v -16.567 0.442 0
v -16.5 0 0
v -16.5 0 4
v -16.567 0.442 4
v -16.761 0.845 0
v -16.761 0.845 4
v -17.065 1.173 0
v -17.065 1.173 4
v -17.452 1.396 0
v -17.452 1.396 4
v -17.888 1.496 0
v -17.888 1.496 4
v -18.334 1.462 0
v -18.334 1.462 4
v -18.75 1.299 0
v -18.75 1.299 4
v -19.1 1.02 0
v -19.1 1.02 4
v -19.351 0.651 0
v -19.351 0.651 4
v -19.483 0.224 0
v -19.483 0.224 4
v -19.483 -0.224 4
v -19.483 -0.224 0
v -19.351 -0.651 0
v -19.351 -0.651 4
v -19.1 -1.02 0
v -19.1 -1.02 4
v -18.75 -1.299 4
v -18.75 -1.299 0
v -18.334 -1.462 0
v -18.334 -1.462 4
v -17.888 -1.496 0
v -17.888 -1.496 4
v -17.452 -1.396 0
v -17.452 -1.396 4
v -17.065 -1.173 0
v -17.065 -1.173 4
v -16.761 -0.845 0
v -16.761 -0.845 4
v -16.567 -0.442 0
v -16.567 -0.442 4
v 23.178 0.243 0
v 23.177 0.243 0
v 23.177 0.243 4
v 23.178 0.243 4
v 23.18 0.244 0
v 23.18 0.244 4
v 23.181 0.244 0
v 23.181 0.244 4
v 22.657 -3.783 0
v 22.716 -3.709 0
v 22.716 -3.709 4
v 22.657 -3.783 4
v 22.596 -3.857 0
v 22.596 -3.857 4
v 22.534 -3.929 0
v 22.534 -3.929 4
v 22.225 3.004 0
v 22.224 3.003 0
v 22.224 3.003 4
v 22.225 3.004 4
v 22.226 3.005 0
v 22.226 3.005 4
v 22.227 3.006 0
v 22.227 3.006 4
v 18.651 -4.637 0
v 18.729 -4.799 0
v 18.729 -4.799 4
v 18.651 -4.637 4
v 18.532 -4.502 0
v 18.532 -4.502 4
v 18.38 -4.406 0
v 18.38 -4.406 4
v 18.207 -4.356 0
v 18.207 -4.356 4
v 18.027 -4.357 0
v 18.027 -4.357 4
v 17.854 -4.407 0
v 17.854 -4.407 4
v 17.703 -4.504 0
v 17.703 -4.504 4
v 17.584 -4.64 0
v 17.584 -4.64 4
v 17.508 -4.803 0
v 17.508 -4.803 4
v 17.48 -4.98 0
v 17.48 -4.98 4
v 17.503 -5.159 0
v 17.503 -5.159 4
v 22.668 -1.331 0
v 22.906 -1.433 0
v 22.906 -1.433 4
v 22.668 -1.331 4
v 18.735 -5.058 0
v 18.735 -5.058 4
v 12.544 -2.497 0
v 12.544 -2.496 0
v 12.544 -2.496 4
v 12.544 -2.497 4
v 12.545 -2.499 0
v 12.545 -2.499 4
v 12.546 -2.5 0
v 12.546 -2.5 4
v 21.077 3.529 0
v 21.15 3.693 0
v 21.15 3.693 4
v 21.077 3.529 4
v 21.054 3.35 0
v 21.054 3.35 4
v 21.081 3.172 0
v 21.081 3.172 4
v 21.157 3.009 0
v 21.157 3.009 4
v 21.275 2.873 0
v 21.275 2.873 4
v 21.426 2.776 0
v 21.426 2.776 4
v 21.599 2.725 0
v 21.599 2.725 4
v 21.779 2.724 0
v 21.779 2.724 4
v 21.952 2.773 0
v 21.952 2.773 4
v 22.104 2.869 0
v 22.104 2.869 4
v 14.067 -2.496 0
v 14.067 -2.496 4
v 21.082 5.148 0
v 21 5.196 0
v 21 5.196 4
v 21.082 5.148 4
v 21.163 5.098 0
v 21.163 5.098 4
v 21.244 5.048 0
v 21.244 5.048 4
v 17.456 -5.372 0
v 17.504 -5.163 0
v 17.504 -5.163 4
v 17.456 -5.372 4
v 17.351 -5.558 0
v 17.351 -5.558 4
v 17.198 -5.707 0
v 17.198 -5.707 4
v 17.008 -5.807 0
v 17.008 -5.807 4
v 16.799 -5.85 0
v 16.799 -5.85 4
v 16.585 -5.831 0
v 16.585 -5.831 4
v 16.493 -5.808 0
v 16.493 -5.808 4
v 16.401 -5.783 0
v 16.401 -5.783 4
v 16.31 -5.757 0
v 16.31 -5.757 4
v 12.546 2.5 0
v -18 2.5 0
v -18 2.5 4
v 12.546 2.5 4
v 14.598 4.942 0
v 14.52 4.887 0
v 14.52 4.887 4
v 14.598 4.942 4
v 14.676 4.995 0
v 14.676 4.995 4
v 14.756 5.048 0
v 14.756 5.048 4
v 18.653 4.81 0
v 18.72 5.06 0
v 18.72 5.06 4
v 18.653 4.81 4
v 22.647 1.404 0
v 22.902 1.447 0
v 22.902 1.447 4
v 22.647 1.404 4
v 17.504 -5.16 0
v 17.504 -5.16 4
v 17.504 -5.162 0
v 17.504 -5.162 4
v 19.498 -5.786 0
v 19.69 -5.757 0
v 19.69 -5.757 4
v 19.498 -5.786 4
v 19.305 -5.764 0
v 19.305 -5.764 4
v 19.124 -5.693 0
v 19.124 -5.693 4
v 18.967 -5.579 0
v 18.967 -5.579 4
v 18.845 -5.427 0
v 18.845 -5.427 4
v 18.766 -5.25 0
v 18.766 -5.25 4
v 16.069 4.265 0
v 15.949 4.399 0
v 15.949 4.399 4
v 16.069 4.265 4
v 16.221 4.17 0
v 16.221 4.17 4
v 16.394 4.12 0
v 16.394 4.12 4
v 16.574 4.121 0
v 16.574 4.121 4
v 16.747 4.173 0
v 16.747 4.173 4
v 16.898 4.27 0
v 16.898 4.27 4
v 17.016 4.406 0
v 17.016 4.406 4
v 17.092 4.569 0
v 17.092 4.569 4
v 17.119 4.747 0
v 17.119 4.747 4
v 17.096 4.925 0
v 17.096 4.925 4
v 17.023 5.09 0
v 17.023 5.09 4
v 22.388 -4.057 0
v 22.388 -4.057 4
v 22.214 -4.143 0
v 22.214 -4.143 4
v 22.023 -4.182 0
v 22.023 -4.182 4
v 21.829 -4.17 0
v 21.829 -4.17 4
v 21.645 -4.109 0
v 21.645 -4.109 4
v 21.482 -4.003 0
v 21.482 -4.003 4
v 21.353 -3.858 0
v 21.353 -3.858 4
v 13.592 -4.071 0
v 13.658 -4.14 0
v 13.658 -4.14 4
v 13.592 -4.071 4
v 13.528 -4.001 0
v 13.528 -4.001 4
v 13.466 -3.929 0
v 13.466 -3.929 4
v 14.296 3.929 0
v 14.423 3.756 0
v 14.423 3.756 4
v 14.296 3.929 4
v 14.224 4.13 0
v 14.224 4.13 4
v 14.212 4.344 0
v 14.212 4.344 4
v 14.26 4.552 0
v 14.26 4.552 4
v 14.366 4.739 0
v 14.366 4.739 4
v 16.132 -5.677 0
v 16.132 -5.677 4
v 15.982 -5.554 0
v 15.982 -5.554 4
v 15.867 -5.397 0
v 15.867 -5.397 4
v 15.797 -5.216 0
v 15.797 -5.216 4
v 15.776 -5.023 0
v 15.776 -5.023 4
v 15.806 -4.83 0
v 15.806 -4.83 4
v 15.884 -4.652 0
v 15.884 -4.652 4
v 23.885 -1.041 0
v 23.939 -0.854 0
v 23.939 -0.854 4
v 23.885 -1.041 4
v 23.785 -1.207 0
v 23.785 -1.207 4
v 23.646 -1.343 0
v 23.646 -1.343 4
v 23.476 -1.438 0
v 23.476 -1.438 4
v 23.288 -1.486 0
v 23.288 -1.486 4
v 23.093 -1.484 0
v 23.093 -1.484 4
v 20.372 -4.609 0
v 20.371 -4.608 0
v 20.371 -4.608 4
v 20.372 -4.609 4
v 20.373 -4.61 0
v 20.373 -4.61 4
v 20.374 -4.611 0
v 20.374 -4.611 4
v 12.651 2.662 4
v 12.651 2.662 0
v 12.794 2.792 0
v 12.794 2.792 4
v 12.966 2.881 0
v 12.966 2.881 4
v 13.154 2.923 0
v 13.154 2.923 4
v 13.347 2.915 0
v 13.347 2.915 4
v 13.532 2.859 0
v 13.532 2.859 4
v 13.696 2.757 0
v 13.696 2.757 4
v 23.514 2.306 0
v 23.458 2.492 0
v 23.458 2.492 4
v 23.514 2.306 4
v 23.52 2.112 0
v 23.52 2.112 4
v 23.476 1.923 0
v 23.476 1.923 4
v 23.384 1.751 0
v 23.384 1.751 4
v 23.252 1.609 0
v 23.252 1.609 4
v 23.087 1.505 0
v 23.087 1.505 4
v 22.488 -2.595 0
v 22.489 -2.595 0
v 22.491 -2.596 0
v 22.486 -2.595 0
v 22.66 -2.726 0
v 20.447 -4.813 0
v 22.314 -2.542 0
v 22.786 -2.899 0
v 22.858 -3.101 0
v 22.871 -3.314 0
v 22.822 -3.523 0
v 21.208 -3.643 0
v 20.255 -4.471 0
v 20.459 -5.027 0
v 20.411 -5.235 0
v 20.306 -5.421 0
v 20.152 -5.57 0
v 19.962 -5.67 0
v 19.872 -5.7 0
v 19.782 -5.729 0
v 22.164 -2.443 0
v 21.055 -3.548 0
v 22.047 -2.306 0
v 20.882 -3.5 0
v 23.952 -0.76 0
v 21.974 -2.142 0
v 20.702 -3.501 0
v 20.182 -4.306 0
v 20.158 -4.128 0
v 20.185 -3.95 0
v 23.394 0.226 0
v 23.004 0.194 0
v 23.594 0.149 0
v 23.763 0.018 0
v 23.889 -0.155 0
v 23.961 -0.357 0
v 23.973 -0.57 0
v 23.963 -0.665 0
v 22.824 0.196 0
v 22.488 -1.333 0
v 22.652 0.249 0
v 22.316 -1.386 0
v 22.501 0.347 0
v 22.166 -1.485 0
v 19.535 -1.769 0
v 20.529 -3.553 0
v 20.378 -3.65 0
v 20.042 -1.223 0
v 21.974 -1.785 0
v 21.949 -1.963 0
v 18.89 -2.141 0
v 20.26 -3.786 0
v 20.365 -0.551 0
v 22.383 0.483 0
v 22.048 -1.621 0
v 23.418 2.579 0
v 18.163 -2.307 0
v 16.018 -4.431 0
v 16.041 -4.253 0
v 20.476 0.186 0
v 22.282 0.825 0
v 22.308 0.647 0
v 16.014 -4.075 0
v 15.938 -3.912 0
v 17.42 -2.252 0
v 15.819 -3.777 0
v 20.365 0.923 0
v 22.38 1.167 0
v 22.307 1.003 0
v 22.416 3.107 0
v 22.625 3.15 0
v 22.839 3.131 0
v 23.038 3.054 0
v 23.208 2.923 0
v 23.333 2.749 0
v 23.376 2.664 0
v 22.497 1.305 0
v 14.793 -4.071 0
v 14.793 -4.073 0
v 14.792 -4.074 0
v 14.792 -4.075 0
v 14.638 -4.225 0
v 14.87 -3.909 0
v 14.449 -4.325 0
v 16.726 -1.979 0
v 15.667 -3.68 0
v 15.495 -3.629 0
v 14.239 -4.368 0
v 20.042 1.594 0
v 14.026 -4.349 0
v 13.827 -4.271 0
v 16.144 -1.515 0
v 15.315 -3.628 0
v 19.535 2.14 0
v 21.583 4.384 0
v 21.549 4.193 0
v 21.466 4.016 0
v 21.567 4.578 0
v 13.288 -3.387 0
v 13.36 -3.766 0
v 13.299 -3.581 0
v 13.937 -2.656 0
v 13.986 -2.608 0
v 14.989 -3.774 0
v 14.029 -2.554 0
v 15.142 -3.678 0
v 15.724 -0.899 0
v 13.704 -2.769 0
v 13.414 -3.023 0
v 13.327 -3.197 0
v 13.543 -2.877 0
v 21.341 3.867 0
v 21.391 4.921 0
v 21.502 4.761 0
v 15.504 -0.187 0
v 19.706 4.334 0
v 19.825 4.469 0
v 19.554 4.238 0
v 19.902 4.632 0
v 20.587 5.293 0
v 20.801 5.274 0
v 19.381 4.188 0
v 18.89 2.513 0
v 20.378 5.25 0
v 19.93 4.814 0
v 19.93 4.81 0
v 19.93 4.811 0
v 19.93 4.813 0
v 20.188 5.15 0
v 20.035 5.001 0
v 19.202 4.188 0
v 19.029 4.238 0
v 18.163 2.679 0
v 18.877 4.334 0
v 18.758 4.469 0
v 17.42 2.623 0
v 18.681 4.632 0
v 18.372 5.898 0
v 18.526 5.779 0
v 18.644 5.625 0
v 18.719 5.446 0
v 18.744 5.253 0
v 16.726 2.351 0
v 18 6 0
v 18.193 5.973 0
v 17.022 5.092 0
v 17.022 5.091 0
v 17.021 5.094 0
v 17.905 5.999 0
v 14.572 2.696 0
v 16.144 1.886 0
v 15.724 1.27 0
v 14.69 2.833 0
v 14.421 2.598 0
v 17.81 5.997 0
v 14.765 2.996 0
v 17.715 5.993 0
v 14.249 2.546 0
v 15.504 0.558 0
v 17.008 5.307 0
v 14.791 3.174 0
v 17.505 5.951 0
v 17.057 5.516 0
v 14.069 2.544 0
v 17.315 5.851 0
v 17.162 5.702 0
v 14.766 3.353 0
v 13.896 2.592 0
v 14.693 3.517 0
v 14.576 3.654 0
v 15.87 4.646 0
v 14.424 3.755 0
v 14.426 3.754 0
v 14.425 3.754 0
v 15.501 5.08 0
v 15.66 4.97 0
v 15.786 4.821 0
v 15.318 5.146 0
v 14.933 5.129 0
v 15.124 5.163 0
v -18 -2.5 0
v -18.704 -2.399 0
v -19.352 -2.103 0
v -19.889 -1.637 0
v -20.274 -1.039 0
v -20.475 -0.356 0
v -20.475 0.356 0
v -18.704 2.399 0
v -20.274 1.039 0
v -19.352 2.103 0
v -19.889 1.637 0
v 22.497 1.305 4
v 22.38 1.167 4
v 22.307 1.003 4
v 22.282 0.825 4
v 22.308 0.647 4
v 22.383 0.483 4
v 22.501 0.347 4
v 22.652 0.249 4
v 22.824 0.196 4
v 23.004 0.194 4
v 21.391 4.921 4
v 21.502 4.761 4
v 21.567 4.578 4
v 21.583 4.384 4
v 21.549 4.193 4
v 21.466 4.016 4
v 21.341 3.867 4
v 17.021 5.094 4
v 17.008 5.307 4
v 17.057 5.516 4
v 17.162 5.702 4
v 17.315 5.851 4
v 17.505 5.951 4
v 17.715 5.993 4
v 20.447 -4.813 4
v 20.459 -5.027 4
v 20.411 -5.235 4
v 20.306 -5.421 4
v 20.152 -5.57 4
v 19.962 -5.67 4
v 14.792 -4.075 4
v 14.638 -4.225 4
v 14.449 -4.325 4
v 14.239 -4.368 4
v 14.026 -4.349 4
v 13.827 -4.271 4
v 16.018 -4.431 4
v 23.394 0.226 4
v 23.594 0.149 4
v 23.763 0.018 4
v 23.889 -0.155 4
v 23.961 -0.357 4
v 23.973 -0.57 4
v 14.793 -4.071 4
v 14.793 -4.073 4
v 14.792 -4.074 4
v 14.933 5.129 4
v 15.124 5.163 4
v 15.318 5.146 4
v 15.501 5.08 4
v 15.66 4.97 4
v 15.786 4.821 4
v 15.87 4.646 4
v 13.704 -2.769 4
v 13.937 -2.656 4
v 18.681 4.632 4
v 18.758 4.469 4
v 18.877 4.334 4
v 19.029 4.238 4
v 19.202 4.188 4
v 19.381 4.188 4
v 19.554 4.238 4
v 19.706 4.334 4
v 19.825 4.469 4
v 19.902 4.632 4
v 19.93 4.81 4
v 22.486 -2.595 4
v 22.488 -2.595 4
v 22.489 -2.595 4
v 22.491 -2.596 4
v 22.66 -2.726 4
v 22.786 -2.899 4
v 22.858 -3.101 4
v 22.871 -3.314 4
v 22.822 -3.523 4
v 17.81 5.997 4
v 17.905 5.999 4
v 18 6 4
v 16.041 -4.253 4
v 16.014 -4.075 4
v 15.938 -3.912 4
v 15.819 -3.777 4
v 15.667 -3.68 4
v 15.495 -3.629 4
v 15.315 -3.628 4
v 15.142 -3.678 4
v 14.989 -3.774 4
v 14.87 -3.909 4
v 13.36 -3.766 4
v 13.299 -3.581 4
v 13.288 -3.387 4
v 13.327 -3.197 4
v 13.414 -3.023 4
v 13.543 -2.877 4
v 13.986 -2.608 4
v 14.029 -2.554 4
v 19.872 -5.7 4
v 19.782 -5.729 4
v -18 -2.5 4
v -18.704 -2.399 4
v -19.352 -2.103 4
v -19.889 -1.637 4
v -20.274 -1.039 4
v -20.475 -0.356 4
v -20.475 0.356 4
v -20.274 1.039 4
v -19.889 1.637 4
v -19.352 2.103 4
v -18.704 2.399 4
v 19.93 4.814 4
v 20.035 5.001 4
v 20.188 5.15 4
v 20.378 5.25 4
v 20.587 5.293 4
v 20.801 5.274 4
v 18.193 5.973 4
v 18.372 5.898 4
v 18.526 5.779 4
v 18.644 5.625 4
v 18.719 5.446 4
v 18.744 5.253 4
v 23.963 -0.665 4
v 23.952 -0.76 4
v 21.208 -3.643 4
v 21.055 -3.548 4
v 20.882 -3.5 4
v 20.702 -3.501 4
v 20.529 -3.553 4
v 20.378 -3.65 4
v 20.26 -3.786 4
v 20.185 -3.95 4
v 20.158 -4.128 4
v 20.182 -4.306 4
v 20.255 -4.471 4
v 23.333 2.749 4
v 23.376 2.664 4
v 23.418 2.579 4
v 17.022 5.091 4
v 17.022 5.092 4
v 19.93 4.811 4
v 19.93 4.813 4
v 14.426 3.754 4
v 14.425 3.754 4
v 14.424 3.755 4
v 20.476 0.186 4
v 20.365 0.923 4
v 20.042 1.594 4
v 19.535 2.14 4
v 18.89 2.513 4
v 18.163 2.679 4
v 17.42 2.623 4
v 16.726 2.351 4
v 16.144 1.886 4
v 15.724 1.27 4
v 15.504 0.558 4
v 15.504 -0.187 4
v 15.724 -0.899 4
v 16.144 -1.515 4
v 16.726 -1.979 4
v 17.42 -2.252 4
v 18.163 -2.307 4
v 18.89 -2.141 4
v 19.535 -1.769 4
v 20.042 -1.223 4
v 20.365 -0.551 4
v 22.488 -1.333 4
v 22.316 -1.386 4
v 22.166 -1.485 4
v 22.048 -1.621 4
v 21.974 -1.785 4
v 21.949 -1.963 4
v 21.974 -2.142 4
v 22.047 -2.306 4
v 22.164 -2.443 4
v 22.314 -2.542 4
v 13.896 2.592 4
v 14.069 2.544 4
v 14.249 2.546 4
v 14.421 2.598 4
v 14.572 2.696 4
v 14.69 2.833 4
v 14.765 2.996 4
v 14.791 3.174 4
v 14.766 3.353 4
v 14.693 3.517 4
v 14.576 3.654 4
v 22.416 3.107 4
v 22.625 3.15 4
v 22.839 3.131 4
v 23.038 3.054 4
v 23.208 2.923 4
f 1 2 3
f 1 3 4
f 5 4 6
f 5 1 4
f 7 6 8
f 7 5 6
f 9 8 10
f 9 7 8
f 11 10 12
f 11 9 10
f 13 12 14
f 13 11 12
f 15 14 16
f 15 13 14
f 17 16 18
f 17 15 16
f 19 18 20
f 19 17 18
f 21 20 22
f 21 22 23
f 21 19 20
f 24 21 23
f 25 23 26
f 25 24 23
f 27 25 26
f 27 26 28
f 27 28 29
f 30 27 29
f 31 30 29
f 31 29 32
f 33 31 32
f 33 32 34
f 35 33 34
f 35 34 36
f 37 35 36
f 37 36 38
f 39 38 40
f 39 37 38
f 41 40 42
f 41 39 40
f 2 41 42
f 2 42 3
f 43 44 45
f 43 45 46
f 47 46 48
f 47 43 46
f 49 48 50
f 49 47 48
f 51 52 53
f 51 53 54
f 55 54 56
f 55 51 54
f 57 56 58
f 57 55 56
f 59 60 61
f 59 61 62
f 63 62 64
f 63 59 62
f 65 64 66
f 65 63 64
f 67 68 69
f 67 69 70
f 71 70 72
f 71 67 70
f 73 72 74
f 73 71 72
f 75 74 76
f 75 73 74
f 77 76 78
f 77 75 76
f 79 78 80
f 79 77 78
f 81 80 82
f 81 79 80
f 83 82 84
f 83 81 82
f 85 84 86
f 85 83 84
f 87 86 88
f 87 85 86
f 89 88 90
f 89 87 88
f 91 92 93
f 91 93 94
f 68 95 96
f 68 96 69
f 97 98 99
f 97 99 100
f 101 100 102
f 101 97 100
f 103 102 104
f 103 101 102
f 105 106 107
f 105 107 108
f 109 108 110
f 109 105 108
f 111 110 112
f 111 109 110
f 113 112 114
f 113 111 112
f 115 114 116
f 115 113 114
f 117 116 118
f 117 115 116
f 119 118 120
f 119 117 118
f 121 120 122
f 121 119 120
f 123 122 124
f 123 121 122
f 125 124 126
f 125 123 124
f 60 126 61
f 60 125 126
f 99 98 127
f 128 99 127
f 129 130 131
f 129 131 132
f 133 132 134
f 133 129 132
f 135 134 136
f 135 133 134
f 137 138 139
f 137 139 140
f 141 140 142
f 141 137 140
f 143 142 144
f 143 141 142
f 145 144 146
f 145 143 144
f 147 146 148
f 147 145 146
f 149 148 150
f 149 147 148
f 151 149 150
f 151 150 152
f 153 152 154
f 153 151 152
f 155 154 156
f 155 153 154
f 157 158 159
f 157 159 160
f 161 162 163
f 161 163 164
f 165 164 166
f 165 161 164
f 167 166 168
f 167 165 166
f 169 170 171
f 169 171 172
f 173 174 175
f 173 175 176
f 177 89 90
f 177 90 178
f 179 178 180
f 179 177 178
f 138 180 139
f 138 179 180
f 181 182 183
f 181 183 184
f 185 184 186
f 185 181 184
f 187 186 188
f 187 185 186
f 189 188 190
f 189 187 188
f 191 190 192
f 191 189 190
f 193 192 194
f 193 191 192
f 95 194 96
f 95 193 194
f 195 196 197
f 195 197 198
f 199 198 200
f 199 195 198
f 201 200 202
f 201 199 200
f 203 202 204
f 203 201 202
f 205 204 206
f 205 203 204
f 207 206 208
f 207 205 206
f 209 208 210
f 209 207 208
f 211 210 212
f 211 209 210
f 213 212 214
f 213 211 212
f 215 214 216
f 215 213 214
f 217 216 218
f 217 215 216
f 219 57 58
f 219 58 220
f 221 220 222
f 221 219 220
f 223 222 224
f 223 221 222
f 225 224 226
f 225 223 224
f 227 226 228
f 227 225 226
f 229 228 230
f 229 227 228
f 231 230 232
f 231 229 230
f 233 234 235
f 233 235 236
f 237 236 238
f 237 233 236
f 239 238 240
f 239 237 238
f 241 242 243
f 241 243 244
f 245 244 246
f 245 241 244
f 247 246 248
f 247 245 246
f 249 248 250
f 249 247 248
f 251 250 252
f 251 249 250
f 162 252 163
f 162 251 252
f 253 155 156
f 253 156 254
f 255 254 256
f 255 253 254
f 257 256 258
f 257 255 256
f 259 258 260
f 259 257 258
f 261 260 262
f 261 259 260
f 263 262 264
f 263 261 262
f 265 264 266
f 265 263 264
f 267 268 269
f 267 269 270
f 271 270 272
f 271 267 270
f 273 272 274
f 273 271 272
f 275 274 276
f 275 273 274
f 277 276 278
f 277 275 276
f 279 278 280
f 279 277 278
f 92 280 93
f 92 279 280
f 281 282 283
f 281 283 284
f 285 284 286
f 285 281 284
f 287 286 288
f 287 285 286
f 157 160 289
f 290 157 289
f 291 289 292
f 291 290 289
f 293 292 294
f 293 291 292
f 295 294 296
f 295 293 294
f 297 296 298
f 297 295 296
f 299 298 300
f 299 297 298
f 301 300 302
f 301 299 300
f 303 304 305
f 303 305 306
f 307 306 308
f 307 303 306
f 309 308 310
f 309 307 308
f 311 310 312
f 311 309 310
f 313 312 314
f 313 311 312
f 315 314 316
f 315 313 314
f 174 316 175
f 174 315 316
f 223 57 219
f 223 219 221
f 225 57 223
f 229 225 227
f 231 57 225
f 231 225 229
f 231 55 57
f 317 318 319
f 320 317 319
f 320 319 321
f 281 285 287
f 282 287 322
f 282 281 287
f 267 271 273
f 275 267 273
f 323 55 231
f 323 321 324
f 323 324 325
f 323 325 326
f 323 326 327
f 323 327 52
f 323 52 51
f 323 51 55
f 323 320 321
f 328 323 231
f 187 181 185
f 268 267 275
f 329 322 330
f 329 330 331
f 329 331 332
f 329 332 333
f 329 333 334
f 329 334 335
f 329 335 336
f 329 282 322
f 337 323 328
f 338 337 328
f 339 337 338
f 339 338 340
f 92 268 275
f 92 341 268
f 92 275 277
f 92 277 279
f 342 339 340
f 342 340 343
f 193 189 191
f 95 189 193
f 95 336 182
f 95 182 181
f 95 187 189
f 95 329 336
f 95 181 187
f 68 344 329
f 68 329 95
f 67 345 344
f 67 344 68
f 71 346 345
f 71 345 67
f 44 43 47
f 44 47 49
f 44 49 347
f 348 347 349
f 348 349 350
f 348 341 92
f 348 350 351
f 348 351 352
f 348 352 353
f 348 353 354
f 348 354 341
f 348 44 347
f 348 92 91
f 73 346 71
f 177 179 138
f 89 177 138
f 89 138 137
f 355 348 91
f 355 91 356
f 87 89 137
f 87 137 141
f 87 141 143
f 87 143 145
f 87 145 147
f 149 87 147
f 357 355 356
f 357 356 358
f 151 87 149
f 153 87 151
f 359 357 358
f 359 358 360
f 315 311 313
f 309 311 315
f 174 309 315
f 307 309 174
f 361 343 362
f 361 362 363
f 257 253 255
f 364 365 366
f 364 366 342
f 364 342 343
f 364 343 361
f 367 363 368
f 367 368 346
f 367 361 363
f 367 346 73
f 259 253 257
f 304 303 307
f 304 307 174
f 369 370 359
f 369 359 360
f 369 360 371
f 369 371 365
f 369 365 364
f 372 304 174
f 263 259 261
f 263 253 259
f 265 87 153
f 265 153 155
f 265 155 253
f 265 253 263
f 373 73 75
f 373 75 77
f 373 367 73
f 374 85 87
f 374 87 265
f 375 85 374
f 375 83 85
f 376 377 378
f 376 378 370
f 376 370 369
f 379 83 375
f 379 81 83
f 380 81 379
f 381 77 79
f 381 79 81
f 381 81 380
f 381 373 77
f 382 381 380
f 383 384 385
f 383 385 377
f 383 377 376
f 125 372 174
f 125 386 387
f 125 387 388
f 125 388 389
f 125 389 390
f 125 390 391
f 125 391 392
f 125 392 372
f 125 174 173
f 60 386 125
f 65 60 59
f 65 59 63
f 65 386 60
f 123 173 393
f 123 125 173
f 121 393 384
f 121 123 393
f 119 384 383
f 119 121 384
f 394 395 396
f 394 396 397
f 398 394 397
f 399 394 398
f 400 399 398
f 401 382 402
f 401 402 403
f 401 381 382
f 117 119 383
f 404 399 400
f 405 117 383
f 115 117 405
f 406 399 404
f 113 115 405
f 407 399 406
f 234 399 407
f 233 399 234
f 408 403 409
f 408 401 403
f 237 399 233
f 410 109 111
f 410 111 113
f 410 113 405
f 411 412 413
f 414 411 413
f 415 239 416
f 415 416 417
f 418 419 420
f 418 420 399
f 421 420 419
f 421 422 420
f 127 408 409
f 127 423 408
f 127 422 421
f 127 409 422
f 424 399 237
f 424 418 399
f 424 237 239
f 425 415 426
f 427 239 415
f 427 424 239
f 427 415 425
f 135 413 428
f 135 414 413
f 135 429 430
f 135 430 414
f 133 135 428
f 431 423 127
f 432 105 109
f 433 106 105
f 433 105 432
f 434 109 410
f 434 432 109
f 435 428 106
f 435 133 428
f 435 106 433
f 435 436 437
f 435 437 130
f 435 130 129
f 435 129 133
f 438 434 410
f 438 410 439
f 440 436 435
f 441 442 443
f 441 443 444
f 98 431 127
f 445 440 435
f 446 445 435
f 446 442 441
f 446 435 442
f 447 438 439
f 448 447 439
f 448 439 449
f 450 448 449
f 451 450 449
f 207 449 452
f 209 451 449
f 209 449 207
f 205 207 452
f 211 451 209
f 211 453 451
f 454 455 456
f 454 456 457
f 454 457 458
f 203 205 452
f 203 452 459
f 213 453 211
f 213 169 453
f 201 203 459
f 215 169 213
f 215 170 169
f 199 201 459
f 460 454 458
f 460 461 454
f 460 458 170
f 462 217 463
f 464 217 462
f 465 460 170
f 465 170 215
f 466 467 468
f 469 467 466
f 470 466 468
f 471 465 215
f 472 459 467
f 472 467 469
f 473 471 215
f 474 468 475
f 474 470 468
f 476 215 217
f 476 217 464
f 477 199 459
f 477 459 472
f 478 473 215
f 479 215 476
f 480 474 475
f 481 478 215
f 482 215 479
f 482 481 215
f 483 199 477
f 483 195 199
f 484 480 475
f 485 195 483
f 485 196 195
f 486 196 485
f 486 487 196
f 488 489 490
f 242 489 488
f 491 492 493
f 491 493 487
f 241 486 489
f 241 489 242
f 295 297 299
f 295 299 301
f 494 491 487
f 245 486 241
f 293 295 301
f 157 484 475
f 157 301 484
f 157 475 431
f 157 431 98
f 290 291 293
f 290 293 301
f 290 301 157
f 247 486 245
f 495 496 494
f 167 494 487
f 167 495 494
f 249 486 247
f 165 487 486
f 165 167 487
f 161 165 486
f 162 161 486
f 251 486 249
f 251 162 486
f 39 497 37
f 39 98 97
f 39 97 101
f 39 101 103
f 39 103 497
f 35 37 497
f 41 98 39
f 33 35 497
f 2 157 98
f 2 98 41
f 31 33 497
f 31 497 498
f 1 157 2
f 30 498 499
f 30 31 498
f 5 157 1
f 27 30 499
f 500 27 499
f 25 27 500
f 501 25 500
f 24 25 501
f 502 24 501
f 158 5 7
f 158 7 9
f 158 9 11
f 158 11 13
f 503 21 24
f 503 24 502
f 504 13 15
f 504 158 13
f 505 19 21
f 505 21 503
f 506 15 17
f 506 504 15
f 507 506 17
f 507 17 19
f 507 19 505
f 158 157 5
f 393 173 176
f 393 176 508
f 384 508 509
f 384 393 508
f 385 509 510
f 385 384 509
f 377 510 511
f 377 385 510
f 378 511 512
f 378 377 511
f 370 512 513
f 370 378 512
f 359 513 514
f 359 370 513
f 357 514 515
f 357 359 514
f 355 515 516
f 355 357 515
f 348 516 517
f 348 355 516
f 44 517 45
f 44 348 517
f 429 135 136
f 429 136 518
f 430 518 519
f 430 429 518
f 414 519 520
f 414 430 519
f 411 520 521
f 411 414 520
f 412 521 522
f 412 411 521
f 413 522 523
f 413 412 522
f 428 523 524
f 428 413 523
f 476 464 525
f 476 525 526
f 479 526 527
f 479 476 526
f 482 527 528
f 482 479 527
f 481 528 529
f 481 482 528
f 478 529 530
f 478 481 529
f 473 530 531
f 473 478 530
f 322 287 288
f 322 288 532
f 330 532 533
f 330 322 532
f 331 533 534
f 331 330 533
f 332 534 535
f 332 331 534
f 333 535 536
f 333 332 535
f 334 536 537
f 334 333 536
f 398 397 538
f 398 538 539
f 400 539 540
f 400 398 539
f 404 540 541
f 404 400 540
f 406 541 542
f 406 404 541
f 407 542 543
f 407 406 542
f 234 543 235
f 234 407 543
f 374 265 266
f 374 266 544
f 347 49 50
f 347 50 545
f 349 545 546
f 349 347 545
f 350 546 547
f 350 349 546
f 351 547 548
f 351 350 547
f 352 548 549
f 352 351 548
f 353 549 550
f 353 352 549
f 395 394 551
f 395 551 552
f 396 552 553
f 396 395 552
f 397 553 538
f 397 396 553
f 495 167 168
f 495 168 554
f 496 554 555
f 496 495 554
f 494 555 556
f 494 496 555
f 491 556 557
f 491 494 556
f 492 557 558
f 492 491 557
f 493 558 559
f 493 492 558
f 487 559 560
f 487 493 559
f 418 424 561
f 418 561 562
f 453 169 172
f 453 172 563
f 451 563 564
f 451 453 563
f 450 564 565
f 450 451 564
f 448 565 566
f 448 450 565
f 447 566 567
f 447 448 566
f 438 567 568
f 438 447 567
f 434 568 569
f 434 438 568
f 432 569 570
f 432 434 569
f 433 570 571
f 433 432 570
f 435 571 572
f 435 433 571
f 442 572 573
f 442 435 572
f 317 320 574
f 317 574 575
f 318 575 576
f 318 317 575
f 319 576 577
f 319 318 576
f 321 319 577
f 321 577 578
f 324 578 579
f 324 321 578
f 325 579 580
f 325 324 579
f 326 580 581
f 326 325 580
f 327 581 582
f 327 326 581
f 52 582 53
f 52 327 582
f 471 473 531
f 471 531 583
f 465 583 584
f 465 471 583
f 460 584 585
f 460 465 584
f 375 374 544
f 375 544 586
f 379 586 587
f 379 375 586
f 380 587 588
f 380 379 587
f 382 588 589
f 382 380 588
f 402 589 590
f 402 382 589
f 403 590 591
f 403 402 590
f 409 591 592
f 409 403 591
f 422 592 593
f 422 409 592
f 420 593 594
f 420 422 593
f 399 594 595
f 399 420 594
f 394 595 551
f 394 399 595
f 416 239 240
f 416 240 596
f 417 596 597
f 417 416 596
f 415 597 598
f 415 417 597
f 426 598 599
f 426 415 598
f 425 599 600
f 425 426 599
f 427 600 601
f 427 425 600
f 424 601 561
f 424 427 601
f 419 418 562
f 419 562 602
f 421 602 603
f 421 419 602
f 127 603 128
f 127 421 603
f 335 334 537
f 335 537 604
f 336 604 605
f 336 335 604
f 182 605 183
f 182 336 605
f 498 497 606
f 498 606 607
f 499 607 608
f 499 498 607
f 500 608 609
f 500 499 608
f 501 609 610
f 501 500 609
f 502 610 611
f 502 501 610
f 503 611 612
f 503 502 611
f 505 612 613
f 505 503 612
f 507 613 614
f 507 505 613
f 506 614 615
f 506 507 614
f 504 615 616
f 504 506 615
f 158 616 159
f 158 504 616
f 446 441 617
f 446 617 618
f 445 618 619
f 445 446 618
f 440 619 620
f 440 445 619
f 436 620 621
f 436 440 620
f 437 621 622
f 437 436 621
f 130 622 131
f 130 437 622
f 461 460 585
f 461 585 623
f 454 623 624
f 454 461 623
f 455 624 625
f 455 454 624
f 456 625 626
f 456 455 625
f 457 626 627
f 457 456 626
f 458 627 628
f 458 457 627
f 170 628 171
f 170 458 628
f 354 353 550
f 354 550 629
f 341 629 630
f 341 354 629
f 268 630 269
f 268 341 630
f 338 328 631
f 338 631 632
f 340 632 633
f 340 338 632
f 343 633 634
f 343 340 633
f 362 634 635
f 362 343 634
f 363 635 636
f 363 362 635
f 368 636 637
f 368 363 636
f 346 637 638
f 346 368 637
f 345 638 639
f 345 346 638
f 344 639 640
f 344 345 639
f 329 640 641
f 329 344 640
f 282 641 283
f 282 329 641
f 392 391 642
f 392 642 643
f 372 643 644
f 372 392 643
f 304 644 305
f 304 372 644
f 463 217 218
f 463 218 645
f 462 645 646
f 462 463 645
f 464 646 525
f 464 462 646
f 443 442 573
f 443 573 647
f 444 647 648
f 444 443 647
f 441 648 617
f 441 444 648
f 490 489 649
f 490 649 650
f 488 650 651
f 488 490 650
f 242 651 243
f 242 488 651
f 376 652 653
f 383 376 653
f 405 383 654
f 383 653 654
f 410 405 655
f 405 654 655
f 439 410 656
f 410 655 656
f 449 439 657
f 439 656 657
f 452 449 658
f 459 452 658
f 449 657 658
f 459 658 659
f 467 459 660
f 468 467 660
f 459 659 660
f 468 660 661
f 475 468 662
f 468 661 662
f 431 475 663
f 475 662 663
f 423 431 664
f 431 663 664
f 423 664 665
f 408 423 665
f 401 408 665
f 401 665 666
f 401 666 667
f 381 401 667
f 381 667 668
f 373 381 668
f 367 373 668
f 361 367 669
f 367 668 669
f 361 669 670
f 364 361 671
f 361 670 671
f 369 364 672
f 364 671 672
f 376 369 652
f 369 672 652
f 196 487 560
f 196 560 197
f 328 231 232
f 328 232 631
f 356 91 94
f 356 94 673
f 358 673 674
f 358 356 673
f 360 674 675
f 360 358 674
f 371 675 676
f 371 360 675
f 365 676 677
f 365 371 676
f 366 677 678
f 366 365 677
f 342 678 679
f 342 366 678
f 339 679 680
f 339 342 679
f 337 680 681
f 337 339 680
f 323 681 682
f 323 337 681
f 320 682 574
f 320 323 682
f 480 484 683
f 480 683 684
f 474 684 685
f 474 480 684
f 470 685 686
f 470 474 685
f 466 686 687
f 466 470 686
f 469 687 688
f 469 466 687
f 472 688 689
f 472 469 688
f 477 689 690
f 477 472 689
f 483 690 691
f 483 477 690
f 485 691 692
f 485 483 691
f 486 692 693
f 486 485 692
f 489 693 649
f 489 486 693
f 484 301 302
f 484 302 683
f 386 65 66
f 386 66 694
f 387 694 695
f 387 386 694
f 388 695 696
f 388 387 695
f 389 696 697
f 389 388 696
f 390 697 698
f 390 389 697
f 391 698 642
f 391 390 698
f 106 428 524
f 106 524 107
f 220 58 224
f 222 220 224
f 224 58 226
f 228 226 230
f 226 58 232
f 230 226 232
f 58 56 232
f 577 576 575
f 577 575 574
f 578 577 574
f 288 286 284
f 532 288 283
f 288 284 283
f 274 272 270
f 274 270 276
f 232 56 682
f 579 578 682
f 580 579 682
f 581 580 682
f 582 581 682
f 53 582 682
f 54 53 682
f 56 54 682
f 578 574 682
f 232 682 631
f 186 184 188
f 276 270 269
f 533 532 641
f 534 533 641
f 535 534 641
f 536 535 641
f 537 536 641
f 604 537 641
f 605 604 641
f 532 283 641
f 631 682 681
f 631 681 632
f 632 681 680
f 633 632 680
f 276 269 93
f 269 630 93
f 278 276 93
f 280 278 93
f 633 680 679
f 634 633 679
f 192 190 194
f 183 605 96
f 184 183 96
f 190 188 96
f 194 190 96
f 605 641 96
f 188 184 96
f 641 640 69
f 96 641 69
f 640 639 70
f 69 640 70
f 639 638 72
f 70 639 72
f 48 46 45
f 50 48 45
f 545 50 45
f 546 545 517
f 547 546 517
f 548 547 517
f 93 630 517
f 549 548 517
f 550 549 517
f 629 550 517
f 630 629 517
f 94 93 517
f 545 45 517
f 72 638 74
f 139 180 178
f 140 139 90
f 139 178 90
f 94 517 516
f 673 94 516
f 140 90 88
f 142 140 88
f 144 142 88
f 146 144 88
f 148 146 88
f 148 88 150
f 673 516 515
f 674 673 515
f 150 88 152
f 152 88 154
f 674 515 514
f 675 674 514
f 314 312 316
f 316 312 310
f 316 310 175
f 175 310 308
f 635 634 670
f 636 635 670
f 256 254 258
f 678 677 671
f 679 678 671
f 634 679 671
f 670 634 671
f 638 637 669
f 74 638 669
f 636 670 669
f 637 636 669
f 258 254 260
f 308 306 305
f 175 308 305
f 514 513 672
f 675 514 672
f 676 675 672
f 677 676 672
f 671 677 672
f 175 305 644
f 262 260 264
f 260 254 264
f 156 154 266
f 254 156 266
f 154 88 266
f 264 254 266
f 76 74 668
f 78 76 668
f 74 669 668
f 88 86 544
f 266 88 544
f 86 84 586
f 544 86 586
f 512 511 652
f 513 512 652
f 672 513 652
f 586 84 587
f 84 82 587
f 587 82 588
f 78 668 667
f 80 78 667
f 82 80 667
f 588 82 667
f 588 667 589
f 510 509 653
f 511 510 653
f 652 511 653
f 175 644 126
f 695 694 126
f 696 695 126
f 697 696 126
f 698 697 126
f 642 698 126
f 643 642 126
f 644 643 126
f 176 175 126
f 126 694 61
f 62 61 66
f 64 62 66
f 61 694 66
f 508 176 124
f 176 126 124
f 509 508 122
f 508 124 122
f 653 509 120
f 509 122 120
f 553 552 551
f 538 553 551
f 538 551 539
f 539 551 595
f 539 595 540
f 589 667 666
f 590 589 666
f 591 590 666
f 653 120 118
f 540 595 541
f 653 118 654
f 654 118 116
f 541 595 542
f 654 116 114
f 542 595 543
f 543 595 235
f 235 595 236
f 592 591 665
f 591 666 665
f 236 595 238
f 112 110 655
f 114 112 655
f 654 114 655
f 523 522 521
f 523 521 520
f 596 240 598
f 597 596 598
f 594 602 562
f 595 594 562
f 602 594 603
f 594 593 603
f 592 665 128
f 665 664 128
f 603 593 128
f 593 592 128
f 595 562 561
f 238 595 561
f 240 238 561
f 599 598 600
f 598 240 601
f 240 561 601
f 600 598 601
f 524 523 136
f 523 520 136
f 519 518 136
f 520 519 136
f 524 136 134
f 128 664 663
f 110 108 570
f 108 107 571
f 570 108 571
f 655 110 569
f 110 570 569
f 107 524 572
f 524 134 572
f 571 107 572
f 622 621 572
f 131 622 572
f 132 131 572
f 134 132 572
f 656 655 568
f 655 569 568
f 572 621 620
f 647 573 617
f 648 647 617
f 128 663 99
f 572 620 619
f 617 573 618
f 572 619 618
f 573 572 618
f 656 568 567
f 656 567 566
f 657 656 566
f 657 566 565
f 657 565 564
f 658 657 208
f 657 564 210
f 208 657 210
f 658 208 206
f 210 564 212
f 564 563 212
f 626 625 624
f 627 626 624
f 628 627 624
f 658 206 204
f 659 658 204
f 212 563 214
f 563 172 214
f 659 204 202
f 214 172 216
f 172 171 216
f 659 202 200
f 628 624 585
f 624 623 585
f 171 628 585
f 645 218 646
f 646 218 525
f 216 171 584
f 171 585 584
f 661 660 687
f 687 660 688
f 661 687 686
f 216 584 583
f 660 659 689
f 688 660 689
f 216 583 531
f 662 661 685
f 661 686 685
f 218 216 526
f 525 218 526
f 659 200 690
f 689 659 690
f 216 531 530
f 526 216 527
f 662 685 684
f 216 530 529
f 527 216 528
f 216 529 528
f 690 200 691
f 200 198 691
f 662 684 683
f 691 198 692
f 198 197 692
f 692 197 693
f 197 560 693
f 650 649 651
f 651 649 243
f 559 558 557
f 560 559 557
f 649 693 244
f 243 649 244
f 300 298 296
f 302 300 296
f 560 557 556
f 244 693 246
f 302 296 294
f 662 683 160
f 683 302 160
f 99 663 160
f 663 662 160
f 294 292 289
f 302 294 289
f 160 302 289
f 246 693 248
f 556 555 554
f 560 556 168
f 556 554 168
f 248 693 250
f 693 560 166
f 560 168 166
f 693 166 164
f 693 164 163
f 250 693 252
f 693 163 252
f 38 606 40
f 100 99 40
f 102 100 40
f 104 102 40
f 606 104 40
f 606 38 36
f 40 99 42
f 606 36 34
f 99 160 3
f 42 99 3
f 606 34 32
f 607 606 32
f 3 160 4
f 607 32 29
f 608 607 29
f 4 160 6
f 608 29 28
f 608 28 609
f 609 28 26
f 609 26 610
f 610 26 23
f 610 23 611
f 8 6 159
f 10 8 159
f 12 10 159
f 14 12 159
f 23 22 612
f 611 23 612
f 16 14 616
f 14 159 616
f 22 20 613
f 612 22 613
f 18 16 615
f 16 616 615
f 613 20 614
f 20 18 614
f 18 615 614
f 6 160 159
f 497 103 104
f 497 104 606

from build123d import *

# Parameters (mm, degrees)
SKETCH1_R           = 1.5
BOSS_EXTRUDE1_DEPTH = 4
CUT_EXTRUDE1_START  = -4
CUT_EXTRUDE1_DEPTH  = 4
CIRPATTERN2_COUNT   = 11
SKETCH3_W           = 6.093608585
SKETCH3_H           = 4.996234569
BOSS_EXTRUDE2_DEPTH = 4
SKETCH4_R           = 2.5
CUT_EXTRUDE2_DEPTH  = 4


with BuildPart() as part:
    # Sketch1 → Boss-Extrude1 (new body)
    with BuildSketch(Plane.XY):
        with BuildLine():
            Line((-18, 2.5), (12.545643943, 2.5))
            ThreePointArc((12.545643943, 2.5), (24, 0), (12.545643943, -2.5))
            Line((12.545643943, -2.5), (-18, -2.5))
            ThreePointArc((-18, -2.5), (-20.5, 0), (-18, 2.5))
        make_face()
        with Locations((-18, 0)):
            Circle(SKETCH1_R, mode=Mode.SUBTRACT)
    extrude(amount=BOSS_EXTRUDE1_DEPTH)

    # Sketch2 → Cut-Extrude1 (cut)
    with BuildSketch(Plane.XY.offset(4).offset(CUT_EXTRUDE1_START)):
        with BuildLine():
            Line((18.72, 5.06), (18.653012702, 4.81))
            ThreePointArc((18.653012702, 4.81), (19.291515108, 4.181419291), (19.930017513, 4.81))
            ThreePointArc((19.930017513, 4.81), (19.930088137, 4.81213776), (19.930232945, 4.814271778))
            ThreePointArc((19.930232945, 4.814271778), (20.377650935, 5.25023041), (21, 5.196152423))
            ThreePointArc((21, 5.196152423), (19.552914271, 5.795554958), (18, 6))
            ThreePointArc((18, 6), (18.589879661, 5.706078038), (18.72, 5.06))
        make_face()
    cut_extrude1 = extrude(amount=CUT_EXTRUDE1_DEPTH, mode=Mode.SUBTRACT)

    # CirPattern2: Cut-Extrude1 ×11 about axis
    cirpattern2_axis = Axis((18, 0, 0), (0, 0, 1))
    for i in range(1, CIRPATTERN2_COUNT):
        add(cut_extrude1.rotate(cirpattern2_axis, i * 360 / CIRPATTERN2_COUNT), mode=Mode.SUBTRACT)

    # Sketch3 → Boss-Extrude2 (add)
    with BuildSketch(Plane.XY.offset(4)):
        with Locations((12.072309907, 0.001882715)):
            Rectangle(SKETCH3_W, SKETCH3_H)
    extrude(amount=-BOSS_EXTRUDE2_DEPTH)

    # Sketch4 → Cut-Extrude2 (cut)
    with BuildSketch(Plane.XY.offset(4)):
        with Locations((17.976309792, 0.185764476)):
            Circle(SKETCH4_R)
    extrude(amount=-CUT_EXTRUDE2_DEPTH, mode=Mode.SUBTRACT)


solid = part.part
